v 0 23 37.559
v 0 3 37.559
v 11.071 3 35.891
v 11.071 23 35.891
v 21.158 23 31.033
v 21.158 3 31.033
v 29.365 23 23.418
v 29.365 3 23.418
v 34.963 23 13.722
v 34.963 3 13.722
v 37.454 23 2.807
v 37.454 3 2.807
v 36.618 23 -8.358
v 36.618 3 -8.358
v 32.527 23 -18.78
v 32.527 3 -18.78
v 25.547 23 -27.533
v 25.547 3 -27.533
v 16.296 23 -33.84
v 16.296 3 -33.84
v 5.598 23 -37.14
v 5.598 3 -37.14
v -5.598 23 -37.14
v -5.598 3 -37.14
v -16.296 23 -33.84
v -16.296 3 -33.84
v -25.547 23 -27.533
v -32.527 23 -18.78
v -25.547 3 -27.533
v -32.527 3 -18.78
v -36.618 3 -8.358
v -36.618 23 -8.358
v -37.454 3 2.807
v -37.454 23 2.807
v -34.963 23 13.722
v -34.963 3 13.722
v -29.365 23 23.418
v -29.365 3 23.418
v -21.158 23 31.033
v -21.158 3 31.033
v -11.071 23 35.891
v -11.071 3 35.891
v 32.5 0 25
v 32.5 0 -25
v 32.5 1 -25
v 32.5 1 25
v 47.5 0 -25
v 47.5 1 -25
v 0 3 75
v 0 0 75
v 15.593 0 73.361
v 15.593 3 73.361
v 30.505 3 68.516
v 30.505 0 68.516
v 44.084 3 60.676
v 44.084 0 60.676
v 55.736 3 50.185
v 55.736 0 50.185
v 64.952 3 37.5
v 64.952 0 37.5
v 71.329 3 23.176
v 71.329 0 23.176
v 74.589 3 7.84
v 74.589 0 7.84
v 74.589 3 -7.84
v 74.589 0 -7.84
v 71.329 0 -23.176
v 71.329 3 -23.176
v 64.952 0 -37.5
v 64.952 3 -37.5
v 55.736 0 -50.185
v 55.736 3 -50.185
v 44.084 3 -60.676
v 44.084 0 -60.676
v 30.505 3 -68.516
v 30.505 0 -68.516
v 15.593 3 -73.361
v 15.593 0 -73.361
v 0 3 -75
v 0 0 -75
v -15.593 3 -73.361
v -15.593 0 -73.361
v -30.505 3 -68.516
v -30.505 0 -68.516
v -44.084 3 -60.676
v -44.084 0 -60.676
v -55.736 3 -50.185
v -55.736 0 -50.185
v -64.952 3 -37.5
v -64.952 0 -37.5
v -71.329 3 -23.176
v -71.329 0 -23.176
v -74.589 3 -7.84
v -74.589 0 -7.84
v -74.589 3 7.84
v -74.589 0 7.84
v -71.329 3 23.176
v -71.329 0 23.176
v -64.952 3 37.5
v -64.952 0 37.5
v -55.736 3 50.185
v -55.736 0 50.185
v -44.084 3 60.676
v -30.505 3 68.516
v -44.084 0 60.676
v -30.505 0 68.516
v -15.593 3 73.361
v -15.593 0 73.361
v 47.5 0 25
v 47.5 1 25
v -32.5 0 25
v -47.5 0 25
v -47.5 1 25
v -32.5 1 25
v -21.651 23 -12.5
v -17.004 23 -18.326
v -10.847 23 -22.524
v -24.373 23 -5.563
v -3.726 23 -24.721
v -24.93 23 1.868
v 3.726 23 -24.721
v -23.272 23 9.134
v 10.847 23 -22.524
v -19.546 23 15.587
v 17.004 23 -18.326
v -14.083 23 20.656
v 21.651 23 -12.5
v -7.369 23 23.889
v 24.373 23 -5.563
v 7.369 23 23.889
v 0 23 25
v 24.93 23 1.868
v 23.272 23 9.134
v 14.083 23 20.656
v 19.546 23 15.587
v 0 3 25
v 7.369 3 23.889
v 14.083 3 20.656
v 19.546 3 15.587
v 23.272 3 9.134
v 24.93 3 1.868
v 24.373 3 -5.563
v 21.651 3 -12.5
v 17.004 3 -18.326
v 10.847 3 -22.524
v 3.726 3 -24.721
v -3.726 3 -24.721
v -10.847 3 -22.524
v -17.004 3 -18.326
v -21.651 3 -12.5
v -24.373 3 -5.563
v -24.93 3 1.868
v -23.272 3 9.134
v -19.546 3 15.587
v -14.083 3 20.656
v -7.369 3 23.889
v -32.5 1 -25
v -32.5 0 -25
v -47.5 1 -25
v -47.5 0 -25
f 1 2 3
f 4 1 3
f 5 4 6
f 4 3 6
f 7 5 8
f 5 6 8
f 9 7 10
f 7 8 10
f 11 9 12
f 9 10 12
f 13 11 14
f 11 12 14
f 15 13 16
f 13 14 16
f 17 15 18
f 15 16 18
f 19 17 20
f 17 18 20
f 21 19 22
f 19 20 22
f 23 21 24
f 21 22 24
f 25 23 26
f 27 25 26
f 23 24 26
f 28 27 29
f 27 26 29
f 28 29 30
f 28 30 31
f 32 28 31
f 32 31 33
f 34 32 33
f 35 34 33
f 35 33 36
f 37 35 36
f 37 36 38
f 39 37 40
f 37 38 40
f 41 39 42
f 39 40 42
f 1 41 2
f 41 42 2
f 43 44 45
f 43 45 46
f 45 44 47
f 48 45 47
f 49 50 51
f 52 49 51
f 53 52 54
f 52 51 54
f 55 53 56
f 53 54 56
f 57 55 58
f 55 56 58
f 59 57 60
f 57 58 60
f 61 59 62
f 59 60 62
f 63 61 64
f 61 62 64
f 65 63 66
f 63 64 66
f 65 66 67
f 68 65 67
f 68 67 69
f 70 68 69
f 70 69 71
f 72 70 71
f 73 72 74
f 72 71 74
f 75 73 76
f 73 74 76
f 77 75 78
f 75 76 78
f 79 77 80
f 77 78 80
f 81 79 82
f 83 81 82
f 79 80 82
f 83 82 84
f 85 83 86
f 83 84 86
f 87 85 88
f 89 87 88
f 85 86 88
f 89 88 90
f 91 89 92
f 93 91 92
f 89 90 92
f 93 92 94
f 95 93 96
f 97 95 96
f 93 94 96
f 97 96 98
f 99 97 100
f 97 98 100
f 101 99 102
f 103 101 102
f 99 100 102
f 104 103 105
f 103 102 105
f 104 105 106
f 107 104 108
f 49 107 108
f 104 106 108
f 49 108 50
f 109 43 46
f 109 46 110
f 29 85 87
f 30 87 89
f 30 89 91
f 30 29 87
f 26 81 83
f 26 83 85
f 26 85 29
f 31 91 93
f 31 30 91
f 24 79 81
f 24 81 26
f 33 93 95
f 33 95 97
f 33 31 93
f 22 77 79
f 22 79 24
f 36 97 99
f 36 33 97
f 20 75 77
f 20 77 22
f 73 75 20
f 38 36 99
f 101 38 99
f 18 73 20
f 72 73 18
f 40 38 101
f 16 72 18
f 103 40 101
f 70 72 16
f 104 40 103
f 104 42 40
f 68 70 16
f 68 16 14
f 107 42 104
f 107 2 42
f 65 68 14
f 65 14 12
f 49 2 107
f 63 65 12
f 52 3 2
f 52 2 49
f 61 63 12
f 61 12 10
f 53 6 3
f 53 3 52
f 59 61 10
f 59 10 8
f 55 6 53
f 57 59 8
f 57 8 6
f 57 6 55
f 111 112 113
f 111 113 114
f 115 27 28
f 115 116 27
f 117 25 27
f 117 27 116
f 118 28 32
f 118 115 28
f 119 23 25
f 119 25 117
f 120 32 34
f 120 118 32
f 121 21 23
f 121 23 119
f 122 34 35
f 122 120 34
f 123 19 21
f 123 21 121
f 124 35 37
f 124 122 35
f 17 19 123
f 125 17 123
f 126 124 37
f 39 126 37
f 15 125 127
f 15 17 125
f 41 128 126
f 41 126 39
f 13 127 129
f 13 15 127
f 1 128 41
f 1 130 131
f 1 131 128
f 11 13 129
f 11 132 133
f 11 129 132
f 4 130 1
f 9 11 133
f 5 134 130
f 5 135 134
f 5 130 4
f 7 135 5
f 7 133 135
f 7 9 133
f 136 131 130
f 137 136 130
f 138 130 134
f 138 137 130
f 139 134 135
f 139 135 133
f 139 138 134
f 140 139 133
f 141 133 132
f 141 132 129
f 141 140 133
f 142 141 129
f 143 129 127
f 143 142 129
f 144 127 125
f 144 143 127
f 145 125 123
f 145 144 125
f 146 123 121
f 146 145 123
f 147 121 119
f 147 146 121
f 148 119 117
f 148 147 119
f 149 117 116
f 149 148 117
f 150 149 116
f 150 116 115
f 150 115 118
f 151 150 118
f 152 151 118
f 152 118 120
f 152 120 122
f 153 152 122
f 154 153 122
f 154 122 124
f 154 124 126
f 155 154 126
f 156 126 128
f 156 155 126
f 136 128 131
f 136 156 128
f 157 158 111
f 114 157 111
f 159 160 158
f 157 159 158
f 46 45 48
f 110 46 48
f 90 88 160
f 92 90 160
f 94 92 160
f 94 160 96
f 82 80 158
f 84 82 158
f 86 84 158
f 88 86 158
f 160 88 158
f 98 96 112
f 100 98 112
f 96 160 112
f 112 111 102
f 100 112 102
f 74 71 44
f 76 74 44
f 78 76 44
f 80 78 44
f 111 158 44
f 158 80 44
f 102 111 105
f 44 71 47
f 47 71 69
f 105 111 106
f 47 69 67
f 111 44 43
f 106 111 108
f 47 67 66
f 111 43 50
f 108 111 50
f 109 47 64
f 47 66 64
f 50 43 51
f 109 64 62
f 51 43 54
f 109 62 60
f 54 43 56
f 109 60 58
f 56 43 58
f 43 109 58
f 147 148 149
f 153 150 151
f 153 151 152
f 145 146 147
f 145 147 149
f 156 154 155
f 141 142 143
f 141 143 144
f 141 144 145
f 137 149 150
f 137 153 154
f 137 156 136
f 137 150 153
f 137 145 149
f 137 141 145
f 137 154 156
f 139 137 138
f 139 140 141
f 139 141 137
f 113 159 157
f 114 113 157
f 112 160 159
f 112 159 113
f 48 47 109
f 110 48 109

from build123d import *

# Parameters (mm, degrees)
SKETCH1_R           = 75
BOSS_EXTRUDE1_DEPTH = 3
SKETCH2_W           = 15
SKETCH2_H           = 50
D_N_B_NG_D_NH_DEPTH = 1
SKETCH3_R           = 37.559343171
SKETCH3_R_2         = 25
G_N_V_NG_BI_DEPTH   = 20


with BuildPart() as part:
    # Sketch1 → Boss-Extrude1 (new body)
    with BuildSketch(Plane(origin=(0, 0, 0), x_dir=(1, 0, 0), z_dir=(0, 1, 0))):
        with Locations(Location((0, 0, 0), (0, 0, 270))):
            Circle(SKETCH1_R)
    extrude(amount=BOSS_EXTRUDE1_DEPTH)

    # Sketch2 → Dán Băng dính (cut)
    with BuildSketch(Plane.XZ):
        with Locations((-40, 0)):
            Rectangle(SKETCH2_W, SKETCH2_H)
        with Locations((40, 0)):
            Rectangle(SKETCH2_W, SKETCH2_H)
    extrude(amount=-D_N_B_NG_D_NH_DEPTH, mode=Mode.SUBTRACT)

    # Sketch3 → gắn vòng bi (add)
    with BuildSketch(Plane(origin=(0, 3, 0), x_dir=(1, 0, 0), z_dir=(0, 1, 0))):
        with Locations(Location((0, 0, 0), (0, 0, 270))):
            Circle(SKETCH3_R)
        with Locations(Location((0, 0, 0), (0, 0, 270))):
            Circle(SKETCH3_R_2, mode=Mode.SUBTRACT)
    extrude(amount=G_N_V_NG_BI_DEPTH)


solid = part.part
